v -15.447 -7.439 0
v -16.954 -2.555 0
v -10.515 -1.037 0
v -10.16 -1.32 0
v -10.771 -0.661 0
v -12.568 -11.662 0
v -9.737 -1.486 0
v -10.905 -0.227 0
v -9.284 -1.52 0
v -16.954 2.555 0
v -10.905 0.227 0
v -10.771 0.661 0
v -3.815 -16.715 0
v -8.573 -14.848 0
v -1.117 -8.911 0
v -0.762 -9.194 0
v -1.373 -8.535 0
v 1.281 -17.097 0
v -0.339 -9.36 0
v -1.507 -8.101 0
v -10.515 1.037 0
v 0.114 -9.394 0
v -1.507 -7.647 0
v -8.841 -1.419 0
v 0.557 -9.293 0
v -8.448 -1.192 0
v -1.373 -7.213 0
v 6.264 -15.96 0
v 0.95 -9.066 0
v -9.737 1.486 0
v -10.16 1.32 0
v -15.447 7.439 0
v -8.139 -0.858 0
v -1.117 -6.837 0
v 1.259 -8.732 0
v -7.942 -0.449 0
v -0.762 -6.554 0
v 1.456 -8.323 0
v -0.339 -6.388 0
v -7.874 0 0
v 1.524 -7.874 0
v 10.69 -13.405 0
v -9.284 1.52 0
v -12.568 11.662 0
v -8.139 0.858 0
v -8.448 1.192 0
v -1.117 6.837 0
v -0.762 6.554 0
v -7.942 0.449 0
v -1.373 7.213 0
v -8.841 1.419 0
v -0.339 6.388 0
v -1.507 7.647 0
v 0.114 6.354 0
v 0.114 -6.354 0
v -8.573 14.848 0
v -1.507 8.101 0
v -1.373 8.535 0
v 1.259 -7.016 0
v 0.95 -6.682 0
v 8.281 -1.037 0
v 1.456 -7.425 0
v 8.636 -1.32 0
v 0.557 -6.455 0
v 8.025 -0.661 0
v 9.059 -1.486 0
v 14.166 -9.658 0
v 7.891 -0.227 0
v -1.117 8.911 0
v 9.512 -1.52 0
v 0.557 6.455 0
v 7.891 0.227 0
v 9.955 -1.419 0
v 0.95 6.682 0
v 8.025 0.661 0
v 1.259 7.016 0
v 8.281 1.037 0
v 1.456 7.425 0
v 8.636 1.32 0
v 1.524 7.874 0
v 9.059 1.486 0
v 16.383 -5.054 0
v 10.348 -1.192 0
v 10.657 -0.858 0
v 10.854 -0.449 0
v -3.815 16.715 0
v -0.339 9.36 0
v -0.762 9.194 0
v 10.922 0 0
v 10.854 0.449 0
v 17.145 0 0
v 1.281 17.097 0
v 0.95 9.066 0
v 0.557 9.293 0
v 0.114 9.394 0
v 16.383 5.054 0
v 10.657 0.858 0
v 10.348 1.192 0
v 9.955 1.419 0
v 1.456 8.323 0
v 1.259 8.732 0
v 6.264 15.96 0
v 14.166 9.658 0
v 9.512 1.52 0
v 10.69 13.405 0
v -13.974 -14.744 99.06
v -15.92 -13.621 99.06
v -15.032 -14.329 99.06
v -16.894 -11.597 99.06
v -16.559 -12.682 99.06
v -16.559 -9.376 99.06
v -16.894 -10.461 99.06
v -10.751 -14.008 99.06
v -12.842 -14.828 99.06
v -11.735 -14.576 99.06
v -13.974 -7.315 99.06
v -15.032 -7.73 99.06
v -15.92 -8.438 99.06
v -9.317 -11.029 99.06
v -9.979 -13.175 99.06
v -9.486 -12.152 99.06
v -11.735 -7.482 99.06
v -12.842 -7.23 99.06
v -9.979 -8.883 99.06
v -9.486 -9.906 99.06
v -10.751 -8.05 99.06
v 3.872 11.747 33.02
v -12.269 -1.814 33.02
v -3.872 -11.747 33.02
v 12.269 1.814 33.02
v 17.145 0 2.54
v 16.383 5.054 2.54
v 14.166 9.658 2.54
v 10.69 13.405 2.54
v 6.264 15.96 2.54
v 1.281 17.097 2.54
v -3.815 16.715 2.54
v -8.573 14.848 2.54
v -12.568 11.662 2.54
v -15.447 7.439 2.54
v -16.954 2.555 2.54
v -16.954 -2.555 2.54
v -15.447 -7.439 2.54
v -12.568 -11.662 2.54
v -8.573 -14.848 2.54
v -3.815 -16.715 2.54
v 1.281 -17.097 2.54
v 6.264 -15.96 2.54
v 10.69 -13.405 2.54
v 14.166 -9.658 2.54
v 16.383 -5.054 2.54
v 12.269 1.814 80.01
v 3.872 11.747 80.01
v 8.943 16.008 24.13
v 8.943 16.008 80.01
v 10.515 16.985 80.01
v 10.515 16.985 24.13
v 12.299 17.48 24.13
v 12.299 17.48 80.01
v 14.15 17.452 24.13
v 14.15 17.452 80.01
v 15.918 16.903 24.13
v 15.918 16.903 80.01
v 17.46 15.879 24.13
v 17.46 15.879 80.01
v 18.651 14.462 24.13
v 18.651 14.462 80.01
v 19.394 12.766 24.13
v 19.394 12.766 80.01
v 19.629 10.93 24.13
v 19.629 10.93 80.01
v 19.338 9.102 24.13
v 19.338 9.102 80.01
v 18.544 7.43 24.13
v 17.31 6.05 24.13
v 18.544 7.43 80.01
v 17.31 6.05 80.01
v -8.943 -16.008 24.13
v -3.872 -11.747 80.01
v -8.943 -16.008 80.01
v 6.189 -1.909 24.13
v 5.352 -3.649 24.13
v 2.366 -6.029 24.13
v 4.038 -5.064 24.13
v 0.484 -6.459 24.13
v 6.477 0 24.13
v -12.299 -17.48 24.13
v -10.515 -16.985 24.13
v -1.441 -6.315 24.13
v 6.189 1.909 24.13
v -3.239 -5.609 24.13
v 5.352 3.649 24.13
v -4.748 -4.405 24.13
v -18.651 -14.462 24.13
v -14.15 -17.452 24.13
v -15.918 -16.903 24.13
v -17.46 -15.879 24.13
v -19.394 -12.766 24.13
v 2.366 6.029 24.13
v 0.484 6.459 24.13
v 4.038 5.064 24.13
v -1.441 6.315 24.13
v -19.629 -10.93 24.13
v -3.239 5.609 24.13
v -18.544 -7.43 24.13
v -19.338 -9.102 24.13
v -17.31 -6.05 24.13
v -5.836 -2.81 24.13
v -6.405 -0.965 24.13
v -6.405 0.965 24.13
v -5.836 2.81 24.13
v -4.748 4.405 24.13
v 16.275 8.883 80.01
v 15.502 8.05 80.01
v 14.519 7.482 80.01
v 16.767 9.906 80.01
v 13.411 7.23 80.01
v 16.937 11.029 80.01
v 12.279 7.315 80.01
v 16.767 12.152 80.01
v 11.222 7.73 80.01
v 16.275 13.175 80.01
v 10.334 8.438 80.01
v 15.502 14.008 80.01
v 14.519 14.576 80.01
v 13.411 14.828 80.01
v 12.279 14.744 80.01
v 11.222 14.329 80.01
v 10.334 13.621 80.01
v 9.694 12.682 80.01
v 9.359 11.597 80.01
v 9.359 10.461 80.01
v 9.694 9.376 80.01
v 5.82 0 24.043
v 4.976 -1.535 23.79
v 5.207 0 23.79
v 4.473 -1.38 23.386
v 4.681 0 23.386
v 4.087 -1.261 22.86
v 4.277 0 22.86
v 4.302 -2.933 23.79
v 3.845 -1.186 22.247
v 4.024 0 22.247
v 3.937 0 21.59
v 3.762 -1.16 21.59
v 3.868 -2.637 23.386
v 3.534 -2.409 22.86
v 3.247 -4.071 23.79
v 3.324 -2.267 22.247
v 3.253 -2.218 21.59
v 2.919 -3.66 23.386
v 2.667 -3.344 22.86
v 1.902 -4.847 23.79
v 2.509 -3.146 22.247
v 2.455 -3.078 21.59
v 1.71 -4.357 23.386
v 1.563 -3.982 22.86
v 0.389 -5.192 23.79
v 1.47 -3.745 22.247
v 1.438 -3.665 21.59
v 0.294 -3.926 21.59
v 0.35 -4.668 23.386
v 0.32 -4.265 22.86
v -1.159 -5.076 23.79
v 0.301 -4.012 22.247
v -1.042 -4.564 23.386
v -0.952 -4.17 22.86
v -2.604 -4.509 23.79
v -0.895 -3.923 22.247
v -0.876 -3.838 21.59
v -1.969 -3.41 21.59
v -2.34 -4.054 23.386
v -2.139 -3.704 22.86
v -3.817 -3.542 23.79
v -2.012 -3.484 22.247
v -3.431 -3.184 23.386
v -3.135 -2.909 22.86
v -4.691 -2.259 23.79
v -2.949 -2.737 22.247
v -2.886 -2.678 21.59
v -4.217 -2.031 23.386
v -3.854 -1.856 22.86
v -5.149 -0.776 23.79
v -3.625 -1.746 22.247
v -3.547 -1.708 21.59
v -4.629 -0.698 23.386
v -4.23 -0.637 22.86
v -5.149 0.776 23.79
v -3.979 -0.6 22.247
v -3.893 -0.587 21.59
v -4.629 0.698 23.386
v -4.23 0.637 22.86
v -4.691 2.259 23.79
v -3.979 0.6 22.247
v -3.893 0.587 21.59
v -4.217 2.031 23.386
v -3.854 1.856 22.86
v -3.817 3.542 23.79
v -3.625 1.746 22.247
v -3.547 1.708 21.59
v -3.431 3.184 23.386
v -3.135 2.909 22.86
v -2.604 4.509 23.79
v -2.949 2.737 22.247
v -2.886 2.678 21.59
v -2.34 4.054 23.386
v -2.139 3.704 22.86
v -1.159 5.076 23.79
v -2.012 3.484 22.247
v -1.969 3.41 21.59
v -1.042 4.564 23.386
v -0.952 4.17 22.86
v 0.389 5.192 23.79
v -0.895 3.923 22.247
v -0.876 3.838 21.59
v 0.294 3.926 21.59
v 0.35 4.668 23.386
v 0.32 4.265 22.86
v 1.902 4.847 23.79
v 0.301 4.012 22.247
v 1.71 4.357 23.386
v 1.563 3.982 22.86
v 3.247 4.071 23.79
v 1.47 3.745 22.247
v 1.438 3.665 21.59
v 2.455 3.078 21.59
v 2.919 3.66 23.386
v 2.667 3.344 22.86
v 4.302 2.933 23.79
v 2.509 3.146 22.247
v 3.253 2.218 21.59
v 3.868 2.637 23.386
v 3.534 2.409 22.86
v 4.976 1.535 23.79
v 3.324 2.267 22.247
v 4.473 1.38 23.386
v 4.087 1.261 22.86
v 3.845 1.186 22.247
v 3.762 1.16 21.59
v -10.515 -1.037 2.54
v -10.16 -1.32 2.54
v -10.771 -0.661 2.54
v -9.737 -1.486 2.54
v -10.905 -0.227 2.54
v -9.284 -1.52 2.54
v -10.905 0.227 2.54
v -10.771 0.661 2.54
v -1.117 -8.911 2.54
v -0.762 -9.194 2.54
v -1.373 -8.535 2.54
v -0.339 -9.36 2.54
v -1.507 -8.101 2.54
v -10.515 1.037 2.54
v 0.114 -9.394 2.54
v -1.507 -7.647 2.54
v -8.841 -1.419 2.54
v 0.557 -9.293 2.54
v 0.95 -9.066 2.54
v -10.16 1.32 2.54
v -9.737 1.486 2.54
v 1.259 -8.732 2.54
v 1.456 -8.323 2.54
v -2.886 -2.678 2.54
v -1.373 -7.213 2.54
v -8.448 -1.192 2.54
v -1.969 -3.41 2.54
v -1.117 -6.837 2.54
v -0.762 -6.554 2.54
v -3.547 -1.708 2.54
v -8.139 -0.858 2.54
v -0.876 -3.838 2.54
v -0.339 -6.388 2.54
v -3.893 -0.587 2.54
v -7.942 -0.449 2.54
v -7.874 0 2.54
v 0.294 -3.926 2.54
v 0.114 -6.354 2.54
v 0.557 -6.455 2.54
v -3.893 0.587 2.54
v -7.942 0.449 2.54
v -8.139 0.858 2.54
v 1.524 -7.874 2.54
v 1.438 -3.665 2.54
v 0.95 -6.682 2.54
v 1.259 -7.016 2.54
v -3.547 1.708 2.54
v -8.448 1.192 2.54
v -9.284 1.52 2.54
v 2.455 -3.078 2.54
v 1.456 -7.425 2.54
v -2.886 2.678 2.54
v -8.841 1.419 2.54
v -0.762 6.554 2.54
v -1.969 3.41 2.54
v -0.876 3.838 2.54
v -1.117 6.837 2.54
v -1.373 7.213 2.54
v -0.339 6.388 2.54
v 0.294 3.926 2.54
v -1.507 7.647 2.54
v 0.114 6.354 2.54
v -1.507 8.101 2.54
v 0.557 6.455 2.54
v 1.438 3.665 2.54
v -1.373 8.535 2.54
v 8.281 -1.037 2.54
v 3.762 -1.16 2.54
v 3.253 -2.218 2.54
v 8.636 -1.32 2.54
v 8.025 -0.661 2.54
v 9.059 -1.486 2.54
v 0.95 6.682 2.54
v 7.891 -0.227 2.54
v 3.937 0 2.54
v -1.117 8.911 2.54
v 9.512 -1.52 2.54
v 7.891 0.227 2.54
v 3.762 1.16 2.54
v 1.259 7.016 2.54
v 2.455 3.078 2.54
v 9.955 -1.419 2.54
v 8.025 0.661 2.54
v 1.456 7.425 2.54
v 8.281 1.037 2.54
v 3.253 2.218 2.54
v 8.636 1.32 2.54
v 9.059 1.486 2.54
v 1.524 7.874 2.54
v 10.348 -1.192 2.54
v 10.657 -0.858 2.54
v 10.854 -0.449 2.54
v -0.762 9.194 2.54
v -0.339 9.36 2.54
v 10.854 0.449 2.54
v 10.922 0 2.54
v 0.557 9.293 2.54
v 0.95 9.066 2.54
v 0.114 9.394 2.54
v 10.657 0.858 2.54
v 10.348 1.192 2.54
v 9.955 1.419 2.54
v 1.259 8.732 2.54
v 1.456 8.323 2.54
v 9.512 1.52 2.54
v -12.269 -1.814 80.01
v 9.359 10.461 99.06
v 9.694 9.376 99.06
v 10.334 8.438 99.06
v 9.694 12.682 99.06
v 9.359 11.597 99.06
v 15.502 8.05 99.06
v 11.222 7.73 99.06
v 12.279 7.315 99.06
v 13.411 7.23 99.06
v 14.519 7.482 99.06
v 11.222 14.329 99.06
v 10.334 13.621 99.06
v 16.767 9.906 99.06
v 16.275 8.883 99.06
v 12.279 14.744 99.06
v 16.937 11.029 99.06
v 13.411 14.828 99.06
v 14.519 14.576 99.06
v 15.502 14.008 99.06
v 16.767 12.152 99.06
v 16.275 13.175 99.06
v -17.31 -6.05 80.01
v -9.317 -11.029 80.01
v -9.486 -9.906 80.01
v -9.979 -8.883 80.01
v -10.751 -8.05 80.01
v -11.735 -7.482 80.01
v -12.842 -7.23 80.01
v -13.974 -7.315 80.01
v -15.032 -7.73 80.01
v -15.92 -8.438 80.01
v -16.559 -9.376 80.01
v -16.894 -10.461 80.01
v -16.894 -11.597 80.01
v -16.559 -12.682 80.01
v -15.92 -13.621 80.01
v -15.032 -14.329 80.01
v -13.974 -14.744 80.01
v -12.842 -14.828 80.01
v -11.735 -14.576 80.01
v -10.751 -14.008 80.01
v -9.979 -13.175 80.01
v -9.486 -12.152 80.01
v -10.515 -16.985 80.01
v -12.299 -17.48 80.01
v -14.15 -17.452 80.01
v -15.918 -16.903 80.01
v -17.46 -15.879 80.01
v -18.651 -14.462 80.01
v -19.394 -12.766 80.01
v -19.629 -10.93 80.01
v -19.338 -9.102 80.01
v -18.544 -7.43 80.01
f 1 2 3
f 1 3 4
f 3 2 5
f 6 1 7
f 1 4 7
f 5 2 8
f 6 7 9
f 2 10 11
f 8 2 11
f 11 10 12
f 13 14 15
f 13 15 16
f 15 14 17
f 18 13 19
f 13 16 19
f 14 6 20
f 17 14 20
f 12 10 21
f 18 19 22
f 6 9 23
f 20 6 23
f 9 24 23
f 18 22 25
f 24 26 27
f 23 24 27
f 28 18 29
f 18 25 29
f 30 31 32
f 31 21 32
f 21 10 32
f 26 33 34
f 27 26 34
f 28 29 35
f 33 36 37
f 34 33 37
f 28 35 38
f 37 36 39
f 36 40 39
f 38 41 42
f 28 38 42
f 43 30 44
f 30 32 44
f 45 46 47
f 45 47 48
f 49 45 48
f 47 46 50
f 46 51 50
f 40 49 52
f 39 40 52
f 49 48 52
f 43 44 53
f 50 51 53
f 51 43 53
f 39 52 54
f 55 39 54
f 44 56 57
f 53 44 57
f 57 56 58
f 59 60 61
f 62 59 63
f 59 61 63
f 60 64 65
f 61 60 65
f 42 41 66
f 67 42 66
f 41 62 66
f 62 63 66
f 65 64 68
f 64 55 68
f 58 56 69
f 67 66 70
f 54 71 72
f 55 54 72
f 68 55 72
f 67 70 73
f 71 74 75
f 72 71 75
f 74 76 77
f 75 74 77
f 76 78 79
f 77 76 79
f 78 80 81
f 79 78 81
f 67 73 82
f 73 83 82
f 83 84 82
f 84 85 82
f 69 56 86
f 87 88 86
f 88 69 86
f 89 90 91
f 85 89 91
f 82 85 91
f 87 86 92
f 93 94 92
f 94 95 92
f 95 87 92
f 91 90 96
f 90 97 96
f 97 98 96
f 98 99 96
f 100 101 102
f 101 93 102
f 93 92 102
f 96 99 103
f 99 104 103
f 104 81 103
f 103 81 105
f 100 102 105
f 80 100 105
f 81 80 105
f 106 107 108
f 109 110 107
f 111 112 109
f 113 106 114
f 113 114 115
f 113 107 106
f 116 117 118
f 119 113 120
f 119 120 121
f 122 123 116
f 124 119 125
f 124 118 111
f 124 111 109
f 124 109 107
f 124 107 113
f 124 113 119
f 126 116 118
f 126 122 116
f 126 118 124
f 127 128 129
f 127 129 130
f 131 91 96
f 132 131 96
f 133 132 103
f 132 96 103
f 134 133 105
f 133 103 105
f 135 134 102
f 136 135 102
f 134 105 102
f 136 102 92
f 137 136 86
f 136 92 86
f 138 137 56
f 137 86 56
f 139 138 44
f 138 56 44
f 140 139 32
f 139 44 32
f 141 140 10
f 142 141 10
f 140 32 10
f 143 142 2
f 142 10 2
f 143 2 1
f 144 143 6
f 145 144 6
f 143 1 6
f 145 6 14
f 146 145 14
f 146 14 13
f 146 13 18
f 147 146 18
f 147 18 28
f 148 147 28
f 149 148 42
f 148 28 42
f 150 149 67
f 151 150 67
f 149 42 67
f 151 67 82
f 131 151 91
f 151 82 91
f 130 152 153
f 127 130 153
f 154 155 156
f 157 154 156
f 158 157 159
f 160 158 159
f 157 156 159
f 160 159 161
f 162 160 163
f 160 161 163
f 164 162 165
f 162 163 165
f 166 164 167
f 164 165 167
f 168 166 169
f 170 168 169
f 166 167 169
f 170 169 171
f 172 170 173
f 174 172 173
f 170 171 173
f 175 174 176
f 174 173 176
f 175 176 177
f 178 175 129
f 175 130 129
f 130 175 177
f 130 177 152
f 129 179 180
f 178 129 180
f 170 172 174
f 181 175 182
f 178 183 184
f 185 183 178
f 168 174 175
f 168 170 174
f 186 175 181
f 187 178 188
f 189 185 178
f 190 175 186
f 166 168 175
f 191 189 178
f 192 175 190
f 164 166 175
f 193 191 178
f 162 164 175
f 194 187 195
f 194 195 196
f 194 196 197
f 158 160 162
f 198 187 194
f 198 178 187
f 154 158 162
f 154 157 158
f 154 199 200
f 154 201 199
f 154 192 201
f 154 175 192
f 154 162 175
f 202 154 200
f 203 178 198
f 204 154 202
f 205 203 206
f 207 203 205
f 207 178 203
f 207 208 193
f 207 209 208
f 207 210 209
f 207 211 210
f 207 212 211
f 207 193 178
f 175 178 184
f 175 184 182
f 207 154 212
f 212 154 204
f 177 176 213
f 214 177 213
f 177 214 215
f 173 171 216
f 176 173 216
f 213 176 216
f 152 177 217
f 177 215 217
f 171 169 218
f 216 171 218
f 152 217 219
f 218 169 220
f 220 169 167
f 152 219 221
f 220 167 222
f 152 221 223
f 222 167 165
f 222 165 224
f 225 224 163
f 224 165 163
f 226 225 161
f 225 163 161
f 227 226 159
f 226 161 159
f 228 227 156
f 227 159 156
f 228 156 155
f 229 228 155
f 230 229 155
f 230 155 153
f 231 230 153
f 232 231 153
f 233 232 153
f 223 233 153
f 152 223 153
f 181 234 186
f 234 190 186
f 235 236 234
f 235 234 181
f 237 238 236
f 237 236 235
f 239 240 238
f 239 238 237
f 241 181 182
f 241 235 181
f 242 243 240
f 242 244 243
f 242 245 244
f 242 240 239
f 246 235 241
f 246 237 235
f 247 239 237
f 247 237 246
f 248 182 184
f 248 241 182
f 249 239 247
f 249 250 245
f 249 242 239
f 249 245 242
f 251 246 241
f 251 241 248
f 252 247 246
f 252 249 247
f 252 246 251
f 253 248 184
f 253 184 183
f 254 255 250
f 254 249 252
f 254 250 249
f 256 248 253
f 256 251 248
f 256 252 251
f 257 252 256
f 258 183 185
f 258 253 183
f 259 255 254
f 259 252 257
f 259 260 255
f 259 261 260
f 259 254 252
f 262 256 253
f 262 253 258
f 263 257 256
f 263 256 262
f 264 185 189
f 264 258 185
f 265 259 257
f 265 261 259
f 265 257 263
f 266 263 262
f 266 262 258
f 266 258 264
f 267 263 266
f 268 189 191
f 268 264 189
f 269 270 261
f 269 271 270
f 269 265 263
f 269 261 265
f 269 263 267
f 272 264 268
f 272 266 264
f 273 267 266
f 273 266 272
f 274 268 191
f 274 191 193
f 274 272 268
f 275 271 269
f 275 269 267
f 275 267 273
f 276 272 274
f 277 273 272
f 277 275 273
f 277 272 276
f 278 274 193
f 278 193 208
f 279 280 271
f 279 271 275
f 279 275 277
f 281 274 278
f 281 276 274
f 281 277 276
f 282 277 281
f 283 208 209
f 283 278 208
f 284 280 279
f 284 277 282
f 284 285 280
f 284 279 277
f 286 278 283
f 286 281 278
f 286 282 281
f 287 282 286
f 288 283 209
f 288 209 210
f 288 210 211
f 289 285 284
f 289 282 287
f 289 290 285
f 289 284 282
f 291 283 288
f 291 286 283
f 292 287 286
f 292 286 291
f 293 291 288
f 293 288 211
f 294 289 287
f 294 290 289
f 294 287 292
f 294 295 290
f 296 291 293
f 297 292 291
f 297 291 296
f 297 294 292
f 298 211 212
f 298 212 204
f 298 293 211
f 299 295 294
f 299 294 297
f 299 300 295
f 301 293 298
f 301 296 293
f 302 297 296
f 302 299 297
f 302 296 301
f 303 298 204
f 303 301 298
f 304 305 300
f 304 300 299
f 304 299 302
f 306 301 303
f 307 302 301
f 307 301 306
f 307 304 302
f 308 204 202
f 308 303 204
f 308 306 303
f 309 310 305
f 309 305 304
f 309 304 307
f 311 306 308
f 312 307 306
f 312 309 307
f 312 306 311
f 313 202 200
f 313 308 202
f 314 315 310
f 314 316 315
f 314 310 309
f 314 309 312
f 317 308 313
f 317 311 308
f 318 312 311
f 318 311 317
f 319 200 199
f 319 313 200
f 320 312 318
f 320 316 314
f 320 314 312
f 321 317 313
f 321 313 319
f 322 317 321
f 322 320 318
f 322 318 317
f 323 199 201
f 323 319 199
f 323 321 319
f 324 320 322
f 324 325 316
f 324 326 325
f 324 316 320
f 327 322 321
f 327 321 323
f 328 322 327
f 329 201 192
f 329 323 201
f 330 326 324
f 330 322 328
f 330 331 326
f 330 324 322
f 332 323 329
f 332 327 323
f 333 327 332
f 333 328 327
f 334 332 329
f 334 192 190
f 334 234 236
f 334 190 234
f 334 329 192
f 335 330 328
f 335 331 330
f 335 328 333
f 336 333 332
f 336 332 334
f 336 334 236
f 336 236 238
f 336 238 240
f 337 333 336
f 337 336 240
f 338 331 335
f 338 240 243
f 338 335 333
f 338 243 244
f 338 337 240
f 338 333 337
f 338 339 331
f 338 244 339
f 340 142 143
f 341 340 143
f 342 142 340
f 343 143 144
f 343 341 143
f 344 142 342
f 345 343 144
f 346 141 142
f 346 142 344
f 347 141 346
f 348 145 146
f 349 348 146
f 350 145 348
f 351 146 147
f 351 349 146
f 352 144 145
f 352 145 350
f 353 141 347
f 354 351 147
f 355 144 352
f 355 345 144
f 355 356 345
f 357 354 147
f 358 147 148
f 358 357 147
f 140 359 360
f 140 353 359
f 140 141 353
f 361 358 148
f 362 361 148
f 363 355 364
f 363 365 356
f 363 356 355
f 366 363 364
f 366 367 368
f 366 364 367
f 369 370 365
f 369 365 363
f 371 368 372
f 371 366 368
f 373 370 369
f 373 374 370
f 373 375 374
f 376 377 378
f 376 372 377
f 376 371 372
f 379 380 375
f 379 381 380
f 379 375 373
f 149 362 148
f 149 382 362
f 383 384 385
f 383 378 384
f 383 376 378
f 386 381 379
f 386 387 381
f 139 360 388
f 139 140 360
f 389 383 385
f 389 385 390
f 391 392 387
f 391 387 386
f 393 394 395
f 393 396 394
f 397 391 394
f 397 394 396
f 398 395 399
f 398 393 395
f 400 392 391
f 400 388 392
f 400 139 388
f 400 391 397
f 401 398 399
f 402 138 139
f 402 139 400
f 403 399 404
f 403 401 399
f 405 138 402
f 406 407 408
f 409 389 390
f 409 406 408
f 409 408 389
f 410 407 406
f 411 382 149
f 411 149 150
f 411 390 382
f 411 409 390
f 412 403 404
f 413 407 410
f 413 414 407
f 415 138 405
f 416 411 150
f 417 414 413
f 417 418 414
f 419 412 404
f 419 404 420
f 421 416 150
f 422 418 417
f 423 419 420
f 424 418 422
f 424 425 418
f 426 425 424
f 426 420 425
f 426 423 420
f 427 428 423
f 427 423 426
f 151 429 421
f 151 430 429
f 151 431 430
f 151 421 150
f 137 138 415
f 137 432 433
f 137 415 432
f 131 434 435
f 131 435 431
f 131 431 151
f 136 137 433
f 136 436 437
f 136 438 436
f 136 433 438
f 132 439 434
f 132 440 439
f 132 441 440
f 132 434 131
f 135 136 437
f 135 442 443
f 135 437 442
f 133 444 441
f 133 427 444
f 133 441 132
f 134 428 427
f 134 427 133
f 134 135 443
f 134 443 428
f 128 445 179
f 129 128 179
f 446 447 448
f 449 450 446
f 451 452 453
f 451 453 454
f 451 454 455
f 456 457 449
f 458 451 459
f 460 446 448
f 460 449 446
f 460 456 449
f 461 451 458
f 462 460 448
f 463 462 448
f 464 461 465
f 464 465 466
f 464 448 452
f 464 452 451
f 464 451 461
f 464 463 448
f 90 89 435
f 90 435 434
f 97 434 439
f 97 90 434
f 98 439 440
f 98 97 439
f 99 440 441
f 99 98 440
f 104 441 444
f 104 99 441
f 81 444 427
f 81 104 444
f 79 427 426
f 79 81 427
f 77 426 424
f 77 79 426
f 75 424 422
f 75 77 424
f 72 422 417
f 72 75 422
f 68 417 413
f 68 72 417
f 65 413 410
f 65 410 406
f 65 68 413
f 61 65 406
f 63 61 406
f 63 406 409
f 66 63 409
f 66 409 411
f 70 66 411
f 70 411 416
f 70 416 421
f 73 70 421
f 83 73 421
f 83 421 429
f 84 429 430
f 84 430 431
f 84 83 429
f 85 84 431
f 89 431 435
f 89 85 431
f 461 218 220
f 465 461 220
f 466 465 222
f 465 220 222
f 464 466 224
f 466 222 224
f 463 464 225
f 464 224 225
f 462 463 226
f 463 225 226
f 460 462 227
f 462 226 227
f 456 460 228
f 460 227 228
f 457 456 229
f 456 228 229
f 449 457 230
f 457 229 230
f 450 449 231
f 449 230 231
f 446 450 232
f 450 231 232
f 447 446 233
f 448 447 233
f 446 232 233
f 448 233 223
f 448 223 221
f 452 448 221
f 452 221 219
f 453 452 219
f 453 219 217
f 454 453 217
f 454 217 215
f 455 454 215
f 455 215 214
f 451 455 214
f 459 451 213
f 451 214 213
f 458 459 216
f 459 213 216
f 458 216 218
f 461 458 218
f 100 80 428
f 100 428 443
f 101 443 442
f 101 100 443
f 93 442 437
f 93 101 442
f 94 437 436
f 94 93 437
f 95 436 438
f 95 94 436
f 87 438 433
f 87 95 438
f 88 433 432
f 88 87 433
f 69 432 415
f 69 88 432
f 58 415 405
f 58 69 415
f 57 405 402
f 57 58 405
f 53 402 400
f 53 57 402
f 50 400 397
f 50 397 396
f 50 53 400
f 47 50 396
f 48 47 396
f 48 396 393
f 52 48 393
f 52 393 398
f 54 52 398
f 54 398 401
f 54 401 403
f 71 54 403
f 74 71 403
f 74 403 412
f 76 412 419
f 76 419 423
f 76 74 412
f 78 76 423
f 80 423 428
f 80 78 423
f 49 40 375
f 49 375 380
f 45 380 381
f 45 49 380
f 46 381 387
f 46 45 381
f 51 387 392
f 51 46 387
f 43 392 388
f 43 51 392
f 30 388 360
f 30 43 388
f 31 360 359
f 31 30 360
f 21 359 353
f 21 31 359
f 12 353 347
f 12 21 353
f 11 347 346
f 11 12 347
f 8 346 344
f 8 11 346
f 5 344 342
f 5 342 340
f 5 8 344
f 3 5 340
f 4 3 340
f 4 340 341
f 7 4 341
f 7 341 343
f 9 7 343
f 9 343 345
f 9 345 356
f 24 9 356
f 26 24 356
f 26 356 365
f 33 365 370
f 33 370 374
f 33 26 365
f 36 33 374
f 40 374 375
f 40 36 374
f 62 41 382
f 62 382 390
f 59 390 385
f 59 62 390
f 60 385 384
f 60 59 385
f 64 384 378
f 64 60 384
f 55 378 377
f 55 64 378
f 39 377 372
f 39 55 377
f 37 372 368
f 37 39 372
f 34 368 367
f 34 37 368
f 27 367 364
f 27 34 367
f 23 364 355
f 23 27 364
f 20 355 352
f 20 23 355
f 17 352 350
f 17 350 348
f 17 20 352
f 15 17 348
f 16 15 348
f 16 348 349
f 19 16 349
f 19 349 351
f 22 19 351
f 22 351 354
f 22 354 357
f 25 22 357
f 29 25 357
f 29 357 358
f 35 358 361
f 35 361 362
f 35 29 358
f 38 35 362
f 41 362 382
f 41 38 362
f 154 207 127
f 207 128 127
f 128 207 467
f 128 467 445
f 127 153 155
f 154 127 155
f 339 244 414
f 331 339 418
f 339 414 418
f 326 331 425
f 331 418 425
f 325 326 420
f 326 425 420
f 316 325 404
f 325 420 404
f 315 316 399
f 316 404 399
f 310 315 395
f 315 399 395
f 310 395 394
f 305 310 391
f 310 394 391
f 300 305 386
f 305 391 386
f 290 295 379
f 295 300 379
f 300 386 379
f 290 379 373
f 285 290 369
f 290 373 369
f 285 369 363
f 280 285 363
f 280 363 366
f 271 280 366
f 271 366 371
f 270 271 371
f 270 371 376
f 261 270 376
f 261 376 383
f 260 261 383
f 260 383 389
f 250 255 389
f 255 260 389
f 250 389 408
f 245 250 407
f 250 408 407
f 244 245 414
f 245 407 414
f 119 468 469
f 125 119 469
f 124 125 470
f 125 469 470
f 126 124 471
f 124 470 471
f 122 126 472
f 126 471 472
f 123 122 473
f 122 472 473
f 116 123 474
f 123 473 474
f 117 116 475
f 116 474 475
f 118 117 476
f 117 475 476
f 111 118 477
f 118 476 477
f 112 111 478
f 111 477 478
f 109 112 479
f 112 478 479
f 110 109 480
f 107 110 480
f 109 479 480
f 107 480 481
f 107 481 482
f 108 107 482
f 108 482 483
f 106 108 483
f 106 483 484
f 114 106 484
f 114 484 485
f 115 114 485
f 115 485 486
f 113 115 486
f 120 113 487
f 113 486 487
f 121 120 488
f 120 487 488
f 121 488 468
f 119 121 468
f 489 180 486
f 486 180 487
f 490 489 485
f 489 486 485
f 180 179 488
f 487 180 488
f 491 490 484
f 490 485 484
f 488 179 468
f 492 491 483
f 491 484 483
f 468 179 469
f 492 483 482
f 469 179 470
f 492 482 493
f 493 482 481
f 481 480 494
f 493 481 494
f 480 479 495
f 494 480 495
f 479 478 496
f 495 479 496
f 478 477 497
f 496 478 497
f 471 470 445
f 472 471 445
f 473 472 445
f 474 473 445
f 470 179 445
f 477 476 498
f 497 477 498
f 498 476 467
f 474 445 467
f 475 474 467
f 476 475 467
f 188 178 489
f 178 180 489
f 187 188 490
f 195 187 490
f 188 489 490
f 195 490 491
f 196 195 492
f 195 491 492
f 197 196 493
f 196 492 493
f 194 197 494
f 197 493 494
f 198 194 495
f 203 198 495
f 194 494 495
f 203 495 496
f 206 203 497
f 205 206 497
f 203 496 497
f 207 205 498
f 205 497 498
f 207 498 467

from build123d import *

# Parameters (mm, degrees)
SKETCH1_R                = 17.145
SKETCH1_R_2              = 3.937
SKETCH1_R_3              = 1.524
BOSS_EXTRUDE1_DEPTH      = 2.54
SKETCH2_R                = 3.937
BOSS_EXTRUDE2_DEPTH      = 73.66
BOSS_EXTRUDE2_DEPTH_BACK = 2.54
BOSS_EXTRUDE8_DEPTH      = 3.81
BOSS_EXTRUDE8_DEPTH_BACK = 52.07
SKETCH10_R               = 3.81
BOSS_EXTRUDE9_DEPTH      = 19.05
CUT_EXTRUDE1_DEPTH       = 46.99
FILLET3_R                = 2.54


with BuildPart() as part:
    # Sketch1 → Boss-Extrude1 (new body)
    with BuildSketch(Plane.XY):
        Circle(SKETCH1_R)
        Circle(SKETCH1_R_2, mode=Mode.SUBTRACT)
        with Locations((0, 7.874)):
            Circle(SKETCH1_R_3, mode=Mode.SUBTRACT)
        with Locations((0, -7.874)):
            Circle(SKETCH1_R_3, mode=Mode.SUBTRACT)
        with Locations((-9.398, 0)):
            Circle(SKETCH1_R_3, mode=Mode.SUBTRACT)
        with Locations((9.398, 0)):
            Circle(SKETCH1_R_3, mode=Mode.SUBTRACT)
    extrude(amount=BOSS_EXTRUDE1_DEPTH)

    # Sketch2 → Boss-Extrude2 (add, two sides)
    with BuildSketch(Plane.XY.offset(2.54)) as boss_extrude2_sk:
        Circle(SKETCH2_R)
    extrude(amount=BOSS_EXTRUDE2_DEPTH)
    extrude(boss_extrude2_sk.sketch, amount=-BOSS_EXTRUDE2_DEPTH_BACK)

    # Sketch9 → Boss-Extrude8 (add, two sides)
    with BuildSketch(Plane.XY.offset(76.2)) as boss_extrude8_sk:
        with BuildLine():
            Line((17.310299419, 6.04983425), (-8.943054295, -16.008395932))
            ThreePointArc((-8.943054295, -16.008395932), (-18.105957698, -15.212737654), (-17.310299419, -6.04983425))
            Line((-17.310299419, -6.04983425), (8.943054295, 16.008395932))
            ThreePointArc((8.943054295, 16.008395932), (18.105957698, 15.212737654), (17.310299419, 6.04983425))
        make_face()
    extrude(amount=BOSS_EXTRUDE8_DEPTH)
    extrude(boss_extrude8_sk.sketch, amount=-BOSS_EXTRUDE8_DEPTH_BACK)

    # Sketch10 → Boss-Extrude9 (add)
    with BuildSketch(Plane.XY.offset(80.01)):
        with Locations((13.126676857, 11.029115091)):
            Circle(SKETCH10_R)
        with Locations((-13.126676857, -11.029115091)):
            Circle(SKETCH10_R)
    extrude(amount=BOSS_EXTRUDE9_DEPTH)

    # Sketch11 → Cut-Extrude1 (cut)
    with BuildSketch(Plane.XY.offset(80.01)):
        Polygon((3.374041748, 12.335861743), (-12.725218051, -1.275330633), (-3.374041748, -12.335861743), (12.725218051, 1.275330633), align=None)
    extrude(amount=-CUT_EXTRUDE1_DEPTH, mode=Mode.SUBTRACT)

    # Fillet3
    fillet3_edges = [part.edges().sort_by_distance(p)[0] for p in [
        (-3.937, 0, 24.13),
    ]]
    fillet(fillet3_edges, radius=FILLET3_R)


solid = part.part
